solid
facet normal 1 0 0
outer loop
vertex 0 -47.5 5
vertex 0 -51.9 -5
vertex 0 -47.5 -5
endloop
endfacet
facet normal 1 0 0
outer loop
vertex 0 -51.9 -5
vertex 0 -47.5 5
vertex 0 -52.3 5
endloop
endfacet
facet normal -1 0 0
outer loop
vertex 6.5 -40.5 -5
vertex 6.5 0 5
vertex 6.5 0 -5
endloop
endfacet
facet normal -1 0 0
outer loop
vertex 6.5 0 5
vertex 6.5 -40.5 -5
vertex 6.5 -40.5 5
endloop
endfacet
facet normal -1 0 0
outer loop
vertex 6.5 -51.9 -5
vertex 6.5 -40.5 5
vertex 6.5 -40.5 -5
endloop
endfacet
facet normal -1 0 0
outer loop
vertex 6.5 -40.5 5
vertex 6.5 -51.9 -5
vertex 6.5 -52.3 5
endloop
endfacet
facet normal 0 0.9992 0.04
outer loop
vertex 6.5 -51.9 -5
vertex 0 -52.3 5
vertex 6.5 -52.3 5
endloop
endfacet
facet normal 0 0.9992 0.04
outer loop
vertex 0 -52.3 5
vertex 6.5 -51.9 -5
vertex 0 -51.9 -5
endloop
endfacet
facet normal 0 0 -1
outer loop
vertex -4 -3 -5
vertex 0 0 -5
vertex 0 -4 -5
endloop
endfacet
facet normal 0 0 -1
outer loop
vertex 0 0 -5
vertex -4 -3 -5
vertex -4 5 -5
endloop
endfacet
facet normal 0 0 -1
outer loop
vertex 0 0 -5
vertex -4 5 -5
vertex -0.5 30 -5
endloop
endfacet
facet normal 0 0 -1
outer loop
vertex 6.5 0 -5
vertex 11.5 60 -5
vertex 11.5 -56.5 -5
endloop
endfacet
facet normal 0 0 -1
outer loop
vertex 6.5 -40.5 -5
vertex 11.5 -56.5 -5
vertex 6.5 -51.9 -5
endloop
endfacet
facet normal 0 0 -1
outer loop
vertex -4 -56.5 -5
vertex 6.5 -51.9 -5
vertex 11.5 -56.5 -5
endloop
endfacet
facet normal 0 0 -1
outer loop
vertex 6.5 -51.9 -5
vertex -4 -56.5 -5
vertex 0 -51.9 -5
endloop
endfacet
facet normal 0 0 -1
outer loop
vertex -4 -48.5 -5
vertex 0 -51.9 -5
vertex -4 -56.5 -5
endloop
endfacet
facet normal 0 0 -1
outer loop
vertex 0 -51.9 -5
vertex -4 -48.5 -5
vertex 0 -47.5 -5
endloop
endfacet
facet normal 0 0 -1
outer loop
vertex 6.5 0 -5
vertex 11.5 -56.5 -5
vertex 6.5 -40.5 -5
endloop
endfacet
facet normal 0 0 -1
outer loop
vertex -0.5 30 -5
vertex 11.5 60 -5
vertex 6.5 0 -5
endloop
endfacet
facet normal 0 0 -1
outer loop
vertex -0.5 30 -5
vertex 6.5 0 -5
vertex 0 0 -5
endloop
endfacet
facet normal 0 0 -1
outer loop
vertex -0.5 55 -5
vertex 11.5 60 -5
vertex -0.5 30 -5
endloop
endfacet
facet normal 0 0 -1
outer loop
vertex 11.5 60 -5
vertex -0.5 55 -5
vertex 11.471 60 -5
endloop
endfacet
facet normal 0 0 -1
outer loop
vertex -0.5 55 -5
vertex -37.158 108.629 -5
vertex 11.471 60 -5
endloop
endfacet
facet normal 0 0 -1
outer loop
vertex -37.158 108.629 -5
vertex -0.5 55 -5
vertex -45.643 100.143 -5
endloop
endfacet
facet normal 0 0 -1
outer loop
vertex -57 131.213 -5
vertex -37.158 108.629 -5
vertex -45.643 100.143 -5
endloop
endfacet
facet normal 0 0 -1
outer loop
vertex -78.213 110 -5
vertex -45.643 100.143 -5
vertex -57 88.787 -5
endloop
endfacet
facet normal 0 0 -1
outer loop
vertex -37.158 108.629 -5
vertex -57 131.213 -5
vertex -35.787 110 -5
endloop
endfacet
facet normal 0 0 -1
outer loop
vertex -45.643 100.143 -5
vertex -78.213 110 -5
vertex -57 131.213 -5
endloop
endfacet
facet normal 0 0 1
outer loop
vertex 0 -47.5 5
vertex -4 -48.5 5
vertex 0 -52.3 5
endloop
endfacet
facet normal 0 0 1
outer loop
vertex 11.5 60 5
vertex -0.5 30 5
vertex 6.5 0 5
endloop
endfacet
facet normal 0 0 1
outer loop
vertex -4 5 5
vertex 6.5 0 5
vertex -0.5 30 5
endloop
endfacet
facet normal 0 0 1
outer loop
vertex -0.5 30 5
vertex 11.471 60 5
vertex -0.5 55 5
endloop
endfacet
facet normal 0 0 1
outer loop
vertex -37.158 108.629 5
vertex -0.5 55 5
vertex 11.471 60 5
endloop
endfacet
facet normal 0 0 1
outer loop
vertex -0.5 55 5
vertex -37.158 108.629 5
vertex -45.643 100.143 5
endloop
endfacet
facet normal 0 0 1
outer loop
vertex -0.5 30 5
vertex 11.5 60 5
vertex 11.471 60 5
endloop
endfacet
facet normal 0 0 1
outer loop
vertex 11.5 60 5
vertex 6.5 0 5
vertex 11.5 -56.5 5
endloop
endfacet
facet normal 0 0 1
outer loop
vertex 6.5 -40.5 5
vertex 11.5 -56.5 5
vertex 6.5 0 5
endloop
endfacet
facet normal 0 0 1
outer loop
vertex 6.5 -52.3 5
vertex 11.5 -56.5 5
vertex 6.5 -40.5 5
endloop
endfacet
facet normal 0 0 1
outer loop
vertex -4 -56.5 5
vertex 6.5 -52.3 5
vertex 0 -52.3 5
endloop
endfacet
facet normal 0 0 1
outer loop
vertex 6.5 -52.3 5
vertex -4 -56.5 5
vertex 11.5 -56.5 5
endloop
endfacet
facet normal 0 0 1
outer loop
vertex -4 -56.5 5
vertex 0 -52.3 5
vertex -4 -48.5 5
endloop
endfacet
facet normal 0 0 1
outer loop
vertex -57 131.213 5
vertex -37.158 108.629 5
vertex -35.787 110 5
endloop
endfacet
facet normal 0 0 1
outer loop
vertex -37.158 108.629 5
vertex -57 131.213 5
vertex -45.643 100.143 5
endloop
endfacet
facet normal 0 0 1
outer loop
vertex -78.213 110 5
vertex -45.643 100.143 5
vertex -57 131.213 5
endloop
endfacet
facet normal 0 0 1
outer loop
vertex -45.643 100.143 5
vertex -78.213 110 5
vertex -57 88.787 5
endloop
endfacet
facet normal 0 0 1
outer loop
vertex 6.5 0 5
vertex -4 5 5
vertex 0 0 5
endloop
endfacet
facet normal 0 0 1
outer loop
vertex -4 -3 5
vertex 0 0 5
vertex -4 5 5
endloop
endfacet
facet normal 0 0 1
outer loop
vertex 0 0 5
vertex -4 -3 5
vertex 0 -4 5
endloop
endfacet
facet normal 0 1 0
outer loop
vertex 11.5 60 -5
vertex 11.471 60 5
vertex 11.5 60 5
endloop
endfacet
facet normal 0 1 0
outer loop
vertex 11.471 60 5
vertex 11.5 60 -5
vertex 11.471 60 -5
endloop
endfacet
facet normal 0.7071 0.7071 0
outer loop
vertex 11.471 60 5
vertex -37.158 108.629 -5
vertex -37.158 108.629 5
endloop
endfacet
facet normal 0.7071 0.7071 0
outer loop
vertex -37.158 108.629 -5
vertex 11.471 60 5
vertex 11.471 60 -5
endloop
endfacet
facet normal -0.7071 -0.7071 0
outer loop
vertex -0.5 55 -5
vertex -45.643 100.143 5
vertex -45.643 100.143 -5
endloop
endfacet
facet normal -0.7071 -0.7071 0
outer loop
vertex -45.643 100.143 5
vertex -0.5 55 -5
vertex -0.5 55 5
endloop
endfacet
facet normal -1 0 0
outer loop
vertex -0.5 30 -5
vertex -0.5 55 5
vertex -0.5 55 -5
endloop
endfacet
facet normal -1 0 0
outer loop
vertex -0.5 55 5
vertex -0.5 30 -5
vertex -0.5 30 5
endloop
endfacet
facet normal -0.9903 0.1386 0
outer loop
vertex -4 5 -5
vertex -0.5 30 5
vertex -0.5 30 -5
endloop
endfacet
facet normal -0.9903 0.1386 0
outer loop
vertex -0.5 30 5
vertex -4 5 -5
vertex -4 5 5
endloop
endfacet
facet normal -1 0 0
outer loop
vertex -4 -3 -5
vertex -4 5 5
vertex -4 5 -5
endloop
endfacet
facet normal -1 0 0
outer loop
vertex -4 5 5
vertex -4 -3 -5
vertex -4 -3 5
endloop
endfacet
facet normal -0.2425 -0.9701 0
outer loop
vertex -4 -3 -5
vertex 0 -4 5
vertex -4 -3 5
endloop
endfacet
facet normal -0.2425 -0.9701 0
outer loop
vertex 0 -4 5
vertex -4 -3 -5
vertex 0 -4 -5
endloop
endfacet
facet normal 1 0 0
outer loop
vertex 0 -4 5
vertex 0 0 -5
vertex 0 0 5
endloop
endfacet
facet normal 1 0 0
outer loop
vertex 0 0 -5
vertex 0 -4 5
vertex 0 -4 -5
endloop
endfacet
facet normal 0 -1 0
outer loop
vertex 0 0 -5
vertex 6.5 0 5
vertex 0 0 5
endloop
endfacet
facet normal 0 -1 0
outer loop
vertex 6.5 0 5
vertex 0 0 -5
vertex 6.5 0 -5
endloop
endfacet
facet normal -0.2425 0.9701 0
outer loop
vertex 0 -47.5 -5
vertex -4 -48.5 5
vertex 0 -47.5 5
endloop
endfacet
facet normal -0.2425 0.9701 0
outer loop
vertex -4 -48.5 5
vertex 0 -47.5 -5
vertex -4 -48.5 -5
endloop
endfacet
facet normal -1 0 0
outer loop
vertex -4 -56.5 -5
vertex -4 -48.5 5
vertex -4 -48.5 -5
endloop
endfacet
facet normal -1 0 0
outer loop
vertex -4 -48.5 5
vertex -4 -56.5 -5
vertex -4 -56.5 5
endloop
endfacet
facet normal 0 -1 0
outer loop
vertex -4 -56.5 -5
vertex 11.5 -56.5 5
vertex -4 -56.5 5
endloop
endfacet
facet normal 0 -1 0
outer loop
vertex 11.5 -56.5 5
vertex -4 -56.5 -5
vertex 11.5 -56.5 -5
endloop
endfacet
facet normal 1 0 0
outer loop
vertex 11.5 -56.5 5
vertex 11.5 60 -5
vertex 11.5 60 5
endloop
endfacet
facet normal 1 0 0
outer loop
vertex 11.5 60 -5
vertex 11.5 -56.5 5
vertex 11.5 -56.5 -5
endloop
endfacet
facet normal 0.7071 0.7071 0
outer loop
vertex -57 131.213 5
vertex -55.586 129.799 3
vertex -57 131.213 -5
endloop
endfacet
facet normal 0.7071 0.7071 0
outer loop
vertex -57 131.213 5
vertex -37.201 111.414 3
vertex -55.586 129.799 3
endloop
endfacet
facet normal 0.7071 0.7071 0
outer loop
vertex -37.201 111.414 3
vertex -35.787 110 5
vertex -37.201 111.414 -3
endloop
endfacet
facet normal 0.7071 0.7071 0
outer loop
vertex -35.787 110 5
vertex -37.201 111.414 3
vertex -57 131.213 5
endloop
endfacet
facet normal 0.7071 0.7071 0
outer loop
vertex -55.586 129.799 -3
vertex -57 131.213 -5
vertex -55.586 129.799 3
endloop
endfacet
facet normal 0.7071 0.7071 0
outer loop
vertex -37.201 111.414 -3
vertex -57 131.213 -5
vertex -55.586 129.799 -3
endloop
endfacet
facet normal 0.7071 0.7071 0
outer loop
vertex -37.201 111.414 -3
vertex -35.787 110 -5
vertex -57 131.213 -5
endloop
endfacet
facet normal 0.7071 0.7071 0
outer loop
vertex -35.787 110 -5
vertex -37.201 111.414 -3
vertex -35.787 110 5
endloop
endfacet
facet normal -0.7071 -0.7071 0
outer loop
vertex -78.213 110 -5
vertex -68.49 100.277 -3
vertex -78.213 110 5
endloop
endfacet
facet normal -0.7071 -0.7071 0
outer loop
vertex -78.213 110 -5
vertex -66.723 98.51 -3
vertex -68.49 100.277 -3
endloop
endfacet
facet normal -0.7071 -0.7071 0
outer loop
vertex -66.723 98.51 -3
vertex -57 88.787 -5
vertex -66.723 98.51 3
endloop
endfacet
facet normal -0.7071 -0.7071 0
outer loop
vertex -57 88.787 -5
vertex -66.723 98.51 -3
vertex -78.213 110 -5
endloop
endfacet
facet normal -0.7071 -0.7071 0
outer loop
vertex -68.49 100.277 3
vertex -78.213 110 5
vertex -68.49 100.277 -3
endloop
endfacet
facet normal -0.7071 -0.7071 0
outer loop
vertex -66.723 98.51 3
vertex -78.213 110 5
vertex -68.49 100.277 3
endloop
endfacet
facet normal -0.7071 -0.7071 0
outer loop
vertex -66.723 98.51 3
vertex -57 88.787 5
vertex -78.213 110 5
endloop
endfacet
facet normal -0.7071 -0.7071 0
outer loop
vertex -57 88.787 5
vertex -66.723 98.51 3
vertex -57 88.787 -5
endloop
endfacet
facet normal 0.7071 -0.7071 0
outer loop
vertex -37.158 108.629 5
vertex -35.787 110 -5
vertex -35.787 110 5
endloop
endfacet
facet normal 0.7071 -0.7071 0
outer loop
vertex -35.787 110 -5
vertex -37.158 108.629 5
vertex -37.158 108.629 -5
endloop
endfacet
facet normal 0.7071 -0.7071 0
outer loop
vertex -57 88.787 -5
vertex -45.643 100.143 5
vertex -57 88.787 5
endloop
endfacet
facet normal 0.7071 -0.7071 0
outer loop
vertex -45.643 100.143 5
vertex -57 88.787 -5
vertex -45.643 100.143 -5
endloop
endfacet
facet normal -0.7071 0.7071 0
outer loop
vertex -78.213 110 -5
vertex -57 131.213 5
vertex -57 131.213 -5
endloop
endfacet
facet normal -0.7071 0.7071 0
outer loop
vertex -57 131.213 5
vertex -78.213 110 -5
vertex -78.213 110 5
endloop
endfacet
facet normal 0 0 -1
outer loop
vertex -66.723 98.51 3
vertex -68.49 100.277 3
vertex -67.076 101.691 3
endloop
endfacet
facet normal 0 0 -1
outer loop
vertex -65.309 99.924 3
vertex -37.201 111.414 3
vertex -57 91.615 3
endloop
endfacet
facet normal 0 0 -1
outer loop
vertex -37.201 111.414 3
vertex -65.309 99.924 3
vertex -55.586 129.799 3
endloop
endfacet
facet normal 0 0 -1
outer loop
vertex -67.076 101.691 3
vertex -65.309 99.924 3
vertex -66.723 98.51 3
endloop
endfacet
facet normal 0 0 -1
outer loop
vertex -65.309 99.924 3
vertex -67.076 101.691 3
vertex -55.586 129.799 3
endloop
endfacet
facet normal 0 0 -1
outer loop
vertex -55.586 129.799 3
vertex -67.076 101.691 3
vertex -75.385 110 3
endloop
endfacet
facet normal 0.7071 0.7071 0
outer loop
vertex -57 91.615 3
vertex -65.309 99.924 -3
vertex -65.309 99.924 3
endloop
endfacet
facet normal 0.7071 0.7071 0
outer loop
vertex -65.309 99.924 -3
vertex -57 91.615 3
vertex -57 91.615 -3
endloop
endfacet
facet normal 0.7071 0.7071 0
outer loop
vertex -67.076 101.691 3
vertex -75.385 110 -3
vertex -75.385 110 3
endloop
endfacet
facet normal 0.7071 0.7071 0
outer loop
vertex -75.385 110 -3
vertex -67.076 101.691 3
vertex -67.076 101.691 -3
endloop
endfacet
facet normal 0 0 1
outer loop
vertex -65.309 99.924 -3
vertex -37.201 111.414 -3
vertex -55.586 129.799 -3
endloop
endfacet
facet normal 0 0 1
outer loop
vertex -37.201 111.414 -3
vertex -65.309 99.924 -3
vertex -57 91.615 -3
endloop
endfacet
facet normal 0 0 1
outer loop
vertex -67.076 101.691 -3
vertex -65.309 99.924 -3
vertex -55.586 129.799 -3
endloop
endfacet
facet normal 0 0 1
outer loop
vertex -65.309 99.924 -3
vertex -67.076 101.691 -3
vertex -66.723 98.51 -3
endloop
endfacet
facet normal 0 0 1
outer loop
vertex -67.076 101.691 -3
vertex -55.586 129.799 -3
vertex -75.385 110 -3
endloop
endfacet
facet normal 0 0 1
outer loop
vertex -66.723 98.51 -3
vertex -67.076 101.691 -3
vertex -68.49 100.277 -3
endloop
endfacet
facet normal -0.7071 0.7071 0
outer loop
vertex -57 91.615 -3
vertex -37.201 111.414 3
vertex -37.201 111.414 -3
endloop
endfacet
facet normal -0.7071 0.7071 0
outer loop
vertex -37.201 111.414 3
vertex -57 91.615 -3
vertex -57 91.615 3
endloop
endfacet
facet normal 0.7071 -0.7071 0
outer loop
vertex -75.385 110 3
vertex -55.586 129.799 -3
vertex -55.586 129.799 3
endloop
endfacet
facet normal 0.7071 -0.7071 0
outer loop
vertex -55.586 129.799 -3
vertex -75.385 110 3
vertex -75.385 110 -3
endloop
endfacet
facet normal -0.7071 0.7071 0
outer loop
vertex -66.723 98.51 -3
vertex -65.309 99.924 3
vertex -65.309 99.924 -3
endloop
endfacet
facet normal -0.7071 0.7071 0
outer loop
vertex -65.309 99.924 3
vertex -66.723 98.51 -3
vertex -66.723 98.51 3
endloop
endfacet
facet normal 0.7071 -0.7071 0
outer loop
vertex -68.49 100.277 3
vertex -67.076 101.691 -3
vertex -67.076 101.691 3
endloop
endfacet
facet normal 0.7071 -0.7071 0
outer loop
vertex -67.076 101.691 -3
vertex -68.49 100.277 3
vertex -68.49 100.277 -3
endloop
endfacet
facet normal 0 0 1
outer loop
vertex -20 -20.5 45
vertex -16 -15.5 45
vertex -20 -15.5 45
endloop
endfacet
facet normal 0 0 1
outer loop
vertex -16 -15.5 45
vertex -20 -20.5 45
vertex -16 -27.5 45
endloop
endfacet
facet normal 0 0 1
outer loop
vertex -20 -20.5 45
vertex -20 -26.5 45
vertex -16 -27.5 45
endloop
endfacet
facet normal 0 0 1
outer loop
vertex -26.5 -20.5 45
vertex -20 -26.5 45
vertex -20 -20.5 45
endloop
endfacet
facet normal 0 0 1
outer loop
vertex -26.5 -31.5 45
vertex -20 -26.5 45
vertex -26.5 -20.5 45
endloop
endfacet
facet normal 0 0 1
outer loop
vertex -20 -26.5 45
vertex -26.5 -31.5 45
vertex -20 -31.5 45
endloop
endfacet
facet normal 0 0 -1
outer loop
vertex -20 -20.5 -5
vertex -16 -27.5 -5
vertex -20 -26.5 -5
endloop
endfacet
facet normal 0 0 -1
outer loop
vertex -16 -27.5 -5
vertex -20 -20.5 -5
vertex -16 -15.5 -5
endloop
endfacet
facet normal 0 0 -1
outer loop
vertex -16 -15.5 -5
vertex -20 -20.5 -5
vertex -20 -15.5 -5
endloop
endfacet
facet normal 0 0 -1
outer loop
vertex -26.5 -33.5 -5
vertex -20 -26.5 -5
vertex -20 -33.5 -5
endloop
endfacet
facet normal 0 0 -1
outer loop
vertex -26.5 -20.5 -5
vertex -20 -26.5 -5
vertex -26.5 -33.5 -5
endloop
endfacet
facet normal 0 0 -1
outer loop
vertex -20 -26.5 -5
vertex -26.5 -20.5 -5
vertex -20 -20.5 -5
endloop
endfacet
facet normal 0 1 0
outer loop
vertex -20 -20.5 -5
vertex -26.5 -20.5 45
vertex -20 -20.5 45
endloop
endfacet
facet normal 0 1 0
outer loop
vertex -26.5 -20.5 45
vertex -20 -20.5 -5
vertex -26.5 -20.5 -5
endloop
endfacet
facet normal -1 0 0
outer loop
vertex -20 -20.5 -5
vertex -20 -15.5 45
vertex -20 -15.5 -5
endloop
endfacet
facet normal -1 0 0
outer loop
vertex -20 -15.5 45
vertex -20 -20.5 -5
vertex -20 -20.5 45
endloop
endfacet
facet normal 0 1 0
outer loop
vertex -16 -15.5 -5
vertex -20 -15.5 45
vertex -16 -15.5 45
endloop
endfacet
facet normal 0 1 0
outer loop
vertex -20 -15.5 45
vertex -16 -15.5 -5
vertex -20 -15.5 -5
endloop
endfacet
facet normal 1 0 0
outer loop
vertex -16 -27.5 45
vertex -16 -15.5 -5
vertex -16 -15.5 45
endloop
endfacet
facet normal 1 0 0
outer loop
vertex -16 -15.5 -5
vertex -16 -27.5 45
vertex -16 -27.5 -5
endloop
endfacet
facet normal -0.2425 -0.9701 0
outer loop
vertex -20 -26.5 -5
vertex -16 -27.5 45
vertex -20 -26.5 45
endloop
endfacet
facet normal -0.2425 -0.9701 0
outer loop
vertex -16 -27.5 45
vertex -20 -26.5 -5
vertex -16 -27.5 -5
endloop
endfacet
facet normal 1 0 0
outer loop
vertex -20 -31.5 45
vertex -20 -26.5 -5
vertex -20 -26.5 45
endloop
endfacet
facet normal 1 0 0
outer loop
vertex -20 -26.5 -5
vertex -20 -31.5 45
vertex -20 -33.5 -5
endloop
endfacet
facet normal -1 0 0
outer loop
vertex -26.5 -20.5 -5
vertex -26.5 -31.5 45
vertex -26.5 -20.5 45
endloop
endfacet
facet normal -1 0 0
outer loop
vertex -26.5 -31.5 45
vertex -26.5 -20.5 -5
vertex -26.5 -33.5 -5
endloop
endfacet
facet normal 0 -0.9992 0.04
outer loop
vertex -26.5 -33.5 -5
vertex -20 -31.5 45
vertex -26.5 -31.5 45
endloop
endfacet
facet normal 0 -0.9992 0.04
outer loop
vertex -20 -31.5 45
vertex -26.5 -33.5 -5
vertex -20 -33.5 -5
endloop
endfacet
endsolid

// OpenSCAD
// Filament guide with builtin room for something to clean the filament with

// Arm with 10 mm width, centered on z, and rotated such that z is up, and x and y matches the bed. I hope.


// The bar is the thing we mount on.
bar_width = 6.5;
bar_height = 40.5;
bar_height_slack = 1.0;
bar_width_slack = 0.0;
gap = 10.0;
// The lower arm is the thing that connets to the bar
upper_arm_height = 50.0;
// The width of the front "stoppers"
front_width_stopper = 4.0;
// Bottom thickness
bottom_thickness = 5.0;
// Top thickness
top_thickness = 5.0;
// Backside thickness
backside_thickness = 5.0;


module arm_shape() {

    // 0,0 is the top of the bar, front
    // x is towards the back, y is up.
    color([1,0,0]){
	polygon(points=[
		// Start with passing over the bar, then down and below from front to back.
		[0,0], [bar_width+bar_width_slack,0], 
		// Now, go down to below the bar, leave 10 mm gap
		[bar_width+bar_width_slack, 0-bar_height-bar_height_slack-gap], 
		// Move to front of bar
		[0.0, 0-bar_height-bar_height_slack-gap], 
		// Up, and out, this is 40% of the gap
		[0.0, 0-bar_height-bar_height_slack-gap+0.4*gap],
		// Down, and out to make wedge shape
		[0-front_width_stopper, 0-bar_height-bar_height_slack-gap+0.3*gap], 
		// Further down, while out, to the bottom of the arm
		[0-front_width_stopper, 0-bar_height-bar_height_slack-gap-bottom_thickness], 
		// back to the back of the holder
		[bar_width+bar_width_slack+backside_thickness, 0-bar_height-bar_height_slack-gap-bottom_thickness], 
		// And, up
		[bar_width+bar_width_slack+backside_thickness, top_thickness],
		// Further up, to about 70, something
		[bar_width+bar_width_slack+backside_thickness, top_thickness+55],
		// Front part of the arm
		[bar_width+bar_width_slack+backside_thickness-12, top_thickness+55],
	        // Reduce some material
		[bar_width+bar_width_slack+backside_thickness-12, top_thickness+25],


		// Now, build the stoppers. Back to the front, lets see what happens.
		[0-front_width_stopper, top_thickness],
		// And, down, to build the stopper
		[0-front_width_stopper, 0-0.3*gap],
		// Second part of the stopper
		[0, 0-0.4*gap]
	    ]);
    };


    
    // Arm to hold the cup
    translate([-46.5,101,0]) {
	rotate( [0,0,-45] ) {
	    square([70, 12] );
	}
    }
}

// The actual arm.
module arm() {
    linear_extrude( height=10, center = true ) {    
        arm_shape();
    }
};


// Now, for the wedge.
// TODO: Put the wedge at the underside, and shape the arm to match the angle of the wedge...
// Pretty awesome.
// TODO: Round as many corners as possible.

module wedge_box() {
    linear_extrude( height=50, center = true ) {
        translate([-front_width_stopper,-bar_height+5.0,0]) {
            color("red"){
	        polygon( points=[
                        // This is from the top, leftmost point, to the top, rightmost point
                        [0.0,0.0], [front_width_stopper, 0.0],
                        // Down 5 mm
                        [front_width_stopper, -5.0],
                        // Going under the arm - this is where the wedge shape will be added.
                        [front_width_stopper+bar_width, -5.0],
                        // Going all the way down
                        [front_width_stopper+bar_width, -5.0-gap],
                        // Now, back
                        [front_width_stopper, -5.0-gap],
                        // And, up
                        [front_width_stopper, -5.0-gap+0.4*gap], 
                        [0.0, -5.0-gap+0.3*gap]
                    ]);
            }
        }
    }
}

// This is the actual wedge. Its extruded and then rotated
module wedge_wedge() {
    color("green"){

        // Translate to match the wedge_box
        translate([bar_width/2, -bar_height-gap, 0]) {
            // rotate to match the wedge_box
            rotate([0,180+90,0]) {
                // Extrude
                linear_extrude( height=bar_width, center = true ) {
                    // Translate to match center
                    translate([-25.0,0.0,0.0]) {
	                polygon( points=[
                                // This is a very simple wedge: first to right, then up, then back
                                [0.0,0.0], [50.0,0],
                                // down 3 mm, then back to 1 below
                                [50.0, -3.0], [0.0, -1.0]
                            ]);
                    }
                }
            }
        }
    }
    
}

// This is the actual wedge
module wedge() {
    color("green" ){
        union() {
            wedge_box();
            wedge_wedge();
        }
    }
}

// The width of the slit in the bottom of the cup. Something like filament diameter +.75
slit_width = 1.75+0.75;

// Cup placement
module cup () {
    translate([-57,110,0] ) {
	rotate( [0, -90, -135 ] ) {
	    // Actual cup.
	    difference() {
		cube( size=[10,30,30], center = true );
		// Hollow.
		translate ([0,0,1] ){ 
		    cube( size=[6, 26, 28 ], center = true );
		}
		// Hole for filament
		// This needs to be completely changed.
		translate ([0,0,-14]) {
		    cube( [6,slit_width,2], center = true );
	       	}
	    }
	}
    }
}


////////////////////////////////////////////////////////////////////////////////
// I need the arm, then cutting a bit of the wedge from the arm, then
// a wedge in the same level as the arm.

// Arm with wedge shape cut into it
union() {
    difference() {
        // This is the arm
        //        color("cyan", 0.7 )
        arm();

        // The first edge, used to difference with
        translate([0,0,10]) {

            //color("red", 0.7)
            wedge();
        }
    }
    // Union with the cup
    cup();
}


// And, a new wedge, which needs to have its thick end down.
translate([-20,20,20]){
    rotate([0,180,0]) {
    wedge();
}
}
